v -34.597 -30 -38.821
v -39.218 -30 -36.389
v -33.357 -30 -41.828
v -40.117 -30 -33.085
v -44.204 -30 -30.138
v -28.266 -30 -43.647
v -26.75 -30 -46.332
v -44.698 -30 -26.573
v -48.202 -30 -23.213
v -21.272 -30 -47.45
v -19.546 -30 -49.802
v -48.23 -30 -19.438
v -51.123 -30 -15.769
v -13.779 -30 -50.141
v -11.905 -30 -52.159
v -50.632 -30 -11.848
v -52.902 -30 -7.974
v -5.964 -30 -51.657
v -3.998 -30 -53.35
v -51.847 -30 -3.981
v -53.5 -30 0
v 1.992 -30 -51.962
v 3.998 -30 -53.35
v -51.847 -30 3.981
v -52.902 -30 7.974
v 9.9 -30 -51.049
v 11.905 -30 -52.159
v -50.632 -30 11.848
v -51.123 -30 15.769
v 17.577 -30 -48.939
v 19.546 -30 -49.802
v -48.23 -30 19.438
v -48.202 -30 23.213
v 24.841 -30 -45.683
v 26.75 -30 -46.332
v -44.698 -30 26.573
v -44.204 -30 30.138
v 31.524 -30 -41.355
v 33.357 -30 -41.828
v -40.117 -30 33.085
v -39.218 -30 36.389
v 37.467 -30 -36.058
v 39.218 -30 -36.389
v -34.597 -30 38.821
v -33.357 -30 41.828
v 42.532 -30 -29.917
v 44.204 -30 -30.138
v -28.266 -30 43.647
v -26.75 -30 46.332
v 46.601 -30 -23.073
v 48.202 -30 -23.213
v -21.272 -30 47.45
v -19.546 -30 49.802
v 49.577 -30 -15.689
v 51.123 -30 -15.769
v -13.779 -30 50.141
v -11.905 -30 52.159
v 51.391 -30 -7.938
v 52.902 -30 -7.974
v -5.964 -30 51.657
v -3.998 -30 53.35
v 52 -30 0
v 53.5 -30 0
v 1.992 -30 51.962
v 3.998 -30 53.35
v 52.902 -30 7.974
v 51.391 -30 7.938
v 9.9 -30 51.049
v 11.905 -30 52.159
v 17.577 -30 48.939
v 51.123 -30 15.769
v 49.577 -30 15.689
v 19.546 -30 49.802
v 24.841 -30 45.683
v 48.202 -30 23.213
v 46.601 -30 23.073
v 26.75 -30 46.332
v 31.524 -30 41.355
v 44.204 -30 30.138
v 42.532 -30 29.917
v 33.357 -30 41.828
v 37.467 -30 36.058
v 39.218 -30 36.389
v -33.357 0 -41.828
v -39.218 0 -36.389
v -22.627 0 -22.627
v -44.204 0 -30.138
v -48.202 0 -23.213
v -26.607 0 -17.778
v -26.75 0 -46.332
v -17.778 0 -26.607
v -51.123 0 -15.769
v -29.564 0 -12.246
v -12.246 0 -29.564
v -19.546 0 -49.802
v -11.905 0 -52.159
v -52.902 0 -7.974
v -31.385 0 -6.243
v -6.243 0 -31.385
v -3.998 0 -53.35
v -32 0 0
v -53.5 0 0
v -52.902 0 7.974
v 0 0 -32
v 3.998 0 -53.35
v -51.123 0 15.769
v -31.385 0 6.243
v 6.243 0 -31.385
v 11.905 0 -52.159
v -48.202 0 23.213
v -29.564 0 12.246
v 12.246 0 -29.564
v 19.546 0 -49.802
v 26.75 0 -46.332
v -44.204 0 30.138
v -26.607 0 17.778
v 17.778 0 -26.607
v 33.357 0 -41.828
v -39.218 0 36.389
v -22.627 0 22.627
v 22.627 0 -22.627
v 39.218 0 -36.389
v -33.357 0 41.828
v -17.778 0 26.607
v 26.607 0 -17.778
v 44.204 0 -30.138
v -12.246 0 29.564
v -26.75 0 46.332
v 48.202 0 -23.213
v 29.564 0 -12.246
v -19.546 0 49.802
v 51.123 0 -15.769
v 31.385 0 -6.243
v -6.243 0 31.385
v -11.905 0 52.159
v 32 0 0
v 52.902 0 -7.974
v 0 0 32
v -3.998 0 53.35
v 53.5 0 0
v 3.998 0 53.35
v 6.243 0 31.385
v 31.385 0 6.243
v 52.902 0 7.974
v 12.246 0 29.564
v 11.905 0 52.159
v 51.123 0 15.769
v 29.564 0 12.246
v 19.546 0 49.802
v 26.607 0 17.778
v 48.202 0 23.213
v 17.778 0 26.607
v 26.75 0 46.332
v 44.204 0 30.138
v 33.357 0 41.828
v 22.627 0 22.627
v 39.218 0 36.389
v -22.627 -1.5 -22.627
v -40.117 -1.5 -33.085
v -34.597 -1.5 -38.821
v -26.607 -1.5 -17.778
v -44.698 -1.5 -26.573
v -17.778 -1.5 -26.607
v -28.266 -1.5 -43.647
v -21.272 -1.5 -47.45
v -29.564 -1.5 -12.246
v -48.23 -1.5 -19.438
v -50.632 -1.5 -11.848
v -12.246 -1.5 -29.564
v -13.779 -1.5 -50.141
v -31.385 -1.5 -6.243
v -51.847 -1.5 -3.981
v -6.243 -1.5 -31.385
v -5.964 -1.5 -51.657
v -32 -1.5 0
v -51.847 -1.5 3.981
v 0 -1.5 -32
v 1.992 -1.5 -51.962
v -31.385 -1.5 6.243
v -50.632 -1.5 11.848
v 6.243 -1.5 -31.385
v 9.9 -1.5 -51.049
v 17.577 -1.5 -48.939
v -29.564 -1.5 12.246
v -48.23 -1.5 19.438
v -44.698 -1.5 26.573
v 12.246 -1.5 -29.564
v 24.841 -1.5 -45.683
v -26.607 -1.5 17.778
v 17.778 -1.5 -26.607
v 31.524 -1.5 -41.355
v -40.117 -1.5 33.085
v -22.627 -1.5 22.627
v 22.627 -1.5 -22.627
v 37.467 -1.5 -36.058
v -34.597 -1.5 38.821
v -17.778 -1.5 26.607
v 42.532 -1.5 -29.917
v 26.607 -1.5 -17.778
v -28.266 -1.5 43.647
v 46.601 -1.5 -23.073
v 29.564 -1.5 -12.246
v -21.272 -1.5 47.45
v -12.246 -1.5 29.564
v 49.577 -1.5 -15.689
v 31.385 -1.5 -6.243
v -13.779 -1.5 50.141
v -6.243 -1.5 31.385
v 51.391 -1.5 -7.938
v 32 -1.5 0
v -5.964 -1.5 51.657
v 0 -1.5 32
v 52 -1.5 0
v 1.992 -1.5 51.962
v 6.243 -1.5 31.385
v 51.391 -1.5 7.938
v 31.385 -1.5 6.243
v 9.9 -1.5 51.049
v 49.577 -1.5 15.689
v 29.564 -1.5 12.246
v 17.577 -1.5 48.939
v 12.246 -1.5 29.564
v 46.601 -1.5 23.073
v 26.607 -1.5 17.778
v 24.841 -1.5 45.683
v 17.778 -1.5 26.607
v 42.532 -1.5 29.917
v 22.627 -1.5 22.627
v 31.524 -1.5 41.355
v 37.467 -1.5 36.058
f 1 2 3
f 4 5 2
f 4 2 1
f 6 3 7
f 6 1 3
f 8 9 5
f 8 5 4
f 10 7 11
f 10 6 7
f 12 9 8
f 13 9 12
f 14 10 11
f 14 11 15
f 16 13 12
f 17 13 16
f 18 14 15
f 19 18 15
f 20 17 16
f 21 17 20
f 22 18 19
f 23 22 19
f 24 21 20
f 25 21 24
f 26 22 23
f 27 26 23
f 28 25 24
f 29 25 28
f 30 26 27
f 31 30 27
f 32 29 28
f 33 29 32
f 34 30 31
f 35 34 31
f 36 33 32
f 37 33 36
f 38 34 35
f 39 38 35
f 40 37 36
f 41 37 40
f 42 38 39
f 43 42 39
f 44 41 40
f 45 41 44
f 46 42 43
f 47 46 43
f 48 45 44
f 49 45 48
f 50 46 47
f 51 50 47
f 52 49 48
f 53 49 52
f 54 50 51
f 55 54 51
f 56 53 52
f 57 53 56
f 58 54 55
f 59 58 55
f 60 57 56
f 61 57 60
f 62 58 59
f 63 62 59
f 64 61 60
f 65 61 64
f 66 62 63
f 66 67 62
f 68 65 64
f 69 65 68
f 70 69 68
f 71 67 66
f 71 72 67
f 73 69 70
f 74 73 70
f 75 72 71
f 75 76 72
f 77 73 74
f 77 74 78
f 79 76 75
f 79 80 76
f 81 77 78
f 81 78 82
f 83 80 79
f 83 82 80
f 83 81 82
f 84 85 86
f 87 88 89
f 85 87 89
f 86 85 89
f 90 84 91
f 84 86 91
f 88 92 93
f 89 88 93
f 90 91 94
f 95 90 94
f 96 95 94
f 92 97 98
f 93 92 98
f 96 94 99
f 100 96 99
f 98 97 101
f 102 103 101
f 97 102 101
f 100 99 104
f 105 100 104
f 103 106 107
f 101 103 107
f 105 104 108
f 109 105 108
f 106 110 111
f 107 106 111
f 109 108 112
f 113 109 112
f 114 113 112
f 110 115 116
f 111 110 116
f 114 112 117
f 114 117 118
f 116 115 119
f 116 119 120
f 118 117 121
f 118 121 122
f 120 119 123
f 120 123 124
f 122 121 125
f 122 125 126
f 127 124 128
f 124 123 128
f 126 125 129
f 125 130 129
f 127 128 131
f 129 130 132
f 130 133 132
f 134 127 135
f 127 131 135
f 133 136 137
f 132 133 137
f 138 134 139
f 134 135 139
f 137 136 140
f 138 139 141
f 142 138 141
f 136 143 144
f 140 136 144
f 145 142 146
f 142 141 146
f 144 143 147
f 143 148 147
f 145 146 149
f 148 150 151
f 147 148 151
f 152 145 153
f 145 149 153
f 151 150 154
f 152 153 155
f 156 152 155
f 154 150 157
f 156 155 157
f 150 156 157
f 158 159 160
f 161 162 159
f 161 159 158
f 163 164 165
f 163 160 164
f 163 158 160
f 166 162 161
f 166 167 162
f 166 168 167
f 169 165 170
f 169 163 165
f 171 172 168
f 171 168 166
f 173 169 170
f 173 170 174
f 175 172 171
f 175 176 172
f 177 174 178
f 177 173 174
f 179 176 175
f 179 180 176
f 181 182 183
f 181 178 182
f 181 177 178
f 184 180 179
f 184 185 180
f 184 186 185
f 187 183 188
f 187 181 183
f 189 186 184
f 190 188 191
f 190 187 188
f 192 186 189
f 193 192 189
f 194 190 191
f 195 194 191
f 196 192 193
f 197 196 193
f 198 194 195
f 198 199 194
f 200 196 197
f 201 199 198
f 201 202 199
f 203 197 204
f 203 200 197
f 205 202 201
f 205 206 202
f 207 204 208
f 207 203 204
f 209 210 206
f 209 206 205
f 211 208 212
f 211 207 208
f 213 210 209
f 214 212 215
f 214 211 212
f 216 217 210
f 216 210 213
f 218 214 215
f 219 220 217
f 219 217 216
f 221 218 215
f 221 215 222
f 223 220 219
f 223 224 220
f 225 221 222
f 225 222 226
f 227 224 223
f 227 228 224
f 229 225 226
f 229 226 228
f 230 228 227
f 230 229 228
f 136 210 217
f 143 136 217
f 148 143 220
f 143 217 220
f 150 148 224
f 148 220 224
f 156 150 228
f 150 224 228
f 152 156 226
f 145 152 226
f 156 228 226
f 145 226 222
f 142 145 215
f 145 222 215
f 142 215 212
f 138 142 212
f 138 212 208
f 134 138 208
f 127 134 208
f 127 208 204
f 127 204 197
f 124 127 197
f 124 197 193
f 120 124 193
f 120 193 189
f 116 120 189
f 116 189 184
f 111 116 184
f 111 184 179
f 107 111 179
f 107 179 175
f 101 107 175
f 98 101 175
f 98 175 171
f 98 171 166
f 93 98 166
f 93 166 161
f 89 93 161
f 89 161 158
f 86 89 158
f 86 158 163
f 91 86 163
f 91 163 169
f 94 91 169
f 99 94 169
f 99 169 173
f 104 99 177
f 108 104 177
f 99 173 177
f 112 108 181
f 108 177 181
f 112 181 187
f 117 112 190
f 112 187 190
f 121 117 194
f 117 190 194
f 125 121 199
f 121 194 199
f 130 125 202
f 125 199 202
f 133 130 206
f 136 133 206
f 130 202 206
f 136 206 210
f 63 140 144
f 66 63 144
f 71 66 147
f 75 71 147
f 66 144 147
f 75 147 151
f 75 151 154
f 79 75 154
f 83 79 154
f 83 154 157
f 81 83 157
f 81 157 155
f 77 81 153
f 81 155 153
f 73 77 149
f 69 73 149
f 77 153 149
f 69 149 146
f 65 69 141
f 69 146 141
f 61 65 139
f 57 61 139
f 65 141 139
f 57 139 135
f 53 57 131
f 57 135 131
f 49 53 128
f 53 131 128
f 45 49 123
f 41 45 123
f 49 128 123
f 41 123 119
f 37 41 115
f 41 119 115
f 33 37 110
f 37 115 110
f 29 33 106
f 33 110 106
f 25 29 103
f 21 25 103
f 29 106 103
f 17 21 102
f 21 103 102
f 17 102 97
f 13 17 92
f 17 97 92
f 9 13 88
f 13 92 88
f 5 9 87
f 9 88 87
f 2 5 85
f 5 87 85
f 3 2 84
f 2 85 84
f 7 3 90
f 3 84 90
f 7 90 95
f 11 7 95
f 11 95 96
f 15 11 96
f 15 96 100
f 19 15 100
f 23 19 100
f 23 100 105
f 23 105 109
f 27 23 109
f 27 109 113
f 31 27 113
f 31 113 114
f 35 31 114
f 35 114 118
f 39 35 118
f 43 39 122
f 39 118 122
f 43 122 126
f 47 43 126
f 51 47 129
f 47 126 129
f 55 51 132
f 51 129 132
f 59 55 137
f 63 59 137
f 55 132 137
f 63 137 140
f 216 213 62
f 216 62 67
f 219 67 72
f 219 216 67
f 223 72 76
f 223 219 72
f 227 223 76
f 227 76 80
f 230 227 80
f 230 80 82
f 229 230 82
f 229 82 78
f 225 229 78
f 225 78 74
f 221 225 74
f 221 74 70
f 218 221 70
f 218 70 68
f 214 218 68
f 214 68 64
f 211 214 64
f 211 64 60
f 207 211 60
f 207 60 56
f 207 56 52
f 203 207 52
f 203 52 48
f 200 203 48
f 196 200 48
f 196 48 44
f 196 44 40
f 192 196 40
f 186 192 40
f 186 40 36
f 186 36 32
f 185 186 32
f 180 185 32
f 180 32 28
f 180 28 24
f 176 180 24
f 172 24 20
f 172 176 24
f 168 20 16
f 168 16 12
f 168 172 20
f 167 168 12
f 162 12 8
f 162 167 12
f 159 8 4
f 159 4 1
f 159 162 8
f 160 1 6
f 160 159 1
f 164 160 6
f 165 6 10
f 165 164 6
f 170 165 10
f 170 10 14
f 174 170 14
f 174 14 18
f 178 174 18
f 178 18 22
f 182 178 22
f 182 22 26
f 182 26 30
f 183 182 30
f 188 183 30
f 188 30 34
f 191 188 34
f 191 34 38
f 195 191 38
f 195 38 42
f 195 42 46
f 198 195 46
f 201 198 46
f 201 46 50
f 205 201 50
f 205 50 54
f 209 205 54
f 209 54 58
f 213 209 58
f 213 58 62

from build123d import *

# Parameters (mm, degrees)
F0_R     = 53.5
F0_R_2   = 51.5
F1_DEPTH = 30
F2_T     = -1.5
F3_R     = 32
F4_DEPTH = 25


with BuildPart() as f1:
    # F0 (on Front) → F1 (new body)
    with BuildSketch(Plane.XZ):
        Circle(F0_R)
        Circle(F0_R_2, mode=Mode.SUBTRACT)
        Circle(F0_R_2)
    extrude(amount=F1_DEPTH)

    # F2
    f2_openings = [f1.faces().sort_by_distance(p)[0] for p in [
        (0, -30, 0),
    ]]
    offset(amount=F2_T, openings=f2_openings)

    # F3 (on face) → F4 (cut)
    with BuildSketch(Plane.XZ.offset(1.5)):
        Circle(F3_R)
    extrude(amount=-F4_DEPTH, mode=Mode.SUBTRACT)


solid = f1.part
